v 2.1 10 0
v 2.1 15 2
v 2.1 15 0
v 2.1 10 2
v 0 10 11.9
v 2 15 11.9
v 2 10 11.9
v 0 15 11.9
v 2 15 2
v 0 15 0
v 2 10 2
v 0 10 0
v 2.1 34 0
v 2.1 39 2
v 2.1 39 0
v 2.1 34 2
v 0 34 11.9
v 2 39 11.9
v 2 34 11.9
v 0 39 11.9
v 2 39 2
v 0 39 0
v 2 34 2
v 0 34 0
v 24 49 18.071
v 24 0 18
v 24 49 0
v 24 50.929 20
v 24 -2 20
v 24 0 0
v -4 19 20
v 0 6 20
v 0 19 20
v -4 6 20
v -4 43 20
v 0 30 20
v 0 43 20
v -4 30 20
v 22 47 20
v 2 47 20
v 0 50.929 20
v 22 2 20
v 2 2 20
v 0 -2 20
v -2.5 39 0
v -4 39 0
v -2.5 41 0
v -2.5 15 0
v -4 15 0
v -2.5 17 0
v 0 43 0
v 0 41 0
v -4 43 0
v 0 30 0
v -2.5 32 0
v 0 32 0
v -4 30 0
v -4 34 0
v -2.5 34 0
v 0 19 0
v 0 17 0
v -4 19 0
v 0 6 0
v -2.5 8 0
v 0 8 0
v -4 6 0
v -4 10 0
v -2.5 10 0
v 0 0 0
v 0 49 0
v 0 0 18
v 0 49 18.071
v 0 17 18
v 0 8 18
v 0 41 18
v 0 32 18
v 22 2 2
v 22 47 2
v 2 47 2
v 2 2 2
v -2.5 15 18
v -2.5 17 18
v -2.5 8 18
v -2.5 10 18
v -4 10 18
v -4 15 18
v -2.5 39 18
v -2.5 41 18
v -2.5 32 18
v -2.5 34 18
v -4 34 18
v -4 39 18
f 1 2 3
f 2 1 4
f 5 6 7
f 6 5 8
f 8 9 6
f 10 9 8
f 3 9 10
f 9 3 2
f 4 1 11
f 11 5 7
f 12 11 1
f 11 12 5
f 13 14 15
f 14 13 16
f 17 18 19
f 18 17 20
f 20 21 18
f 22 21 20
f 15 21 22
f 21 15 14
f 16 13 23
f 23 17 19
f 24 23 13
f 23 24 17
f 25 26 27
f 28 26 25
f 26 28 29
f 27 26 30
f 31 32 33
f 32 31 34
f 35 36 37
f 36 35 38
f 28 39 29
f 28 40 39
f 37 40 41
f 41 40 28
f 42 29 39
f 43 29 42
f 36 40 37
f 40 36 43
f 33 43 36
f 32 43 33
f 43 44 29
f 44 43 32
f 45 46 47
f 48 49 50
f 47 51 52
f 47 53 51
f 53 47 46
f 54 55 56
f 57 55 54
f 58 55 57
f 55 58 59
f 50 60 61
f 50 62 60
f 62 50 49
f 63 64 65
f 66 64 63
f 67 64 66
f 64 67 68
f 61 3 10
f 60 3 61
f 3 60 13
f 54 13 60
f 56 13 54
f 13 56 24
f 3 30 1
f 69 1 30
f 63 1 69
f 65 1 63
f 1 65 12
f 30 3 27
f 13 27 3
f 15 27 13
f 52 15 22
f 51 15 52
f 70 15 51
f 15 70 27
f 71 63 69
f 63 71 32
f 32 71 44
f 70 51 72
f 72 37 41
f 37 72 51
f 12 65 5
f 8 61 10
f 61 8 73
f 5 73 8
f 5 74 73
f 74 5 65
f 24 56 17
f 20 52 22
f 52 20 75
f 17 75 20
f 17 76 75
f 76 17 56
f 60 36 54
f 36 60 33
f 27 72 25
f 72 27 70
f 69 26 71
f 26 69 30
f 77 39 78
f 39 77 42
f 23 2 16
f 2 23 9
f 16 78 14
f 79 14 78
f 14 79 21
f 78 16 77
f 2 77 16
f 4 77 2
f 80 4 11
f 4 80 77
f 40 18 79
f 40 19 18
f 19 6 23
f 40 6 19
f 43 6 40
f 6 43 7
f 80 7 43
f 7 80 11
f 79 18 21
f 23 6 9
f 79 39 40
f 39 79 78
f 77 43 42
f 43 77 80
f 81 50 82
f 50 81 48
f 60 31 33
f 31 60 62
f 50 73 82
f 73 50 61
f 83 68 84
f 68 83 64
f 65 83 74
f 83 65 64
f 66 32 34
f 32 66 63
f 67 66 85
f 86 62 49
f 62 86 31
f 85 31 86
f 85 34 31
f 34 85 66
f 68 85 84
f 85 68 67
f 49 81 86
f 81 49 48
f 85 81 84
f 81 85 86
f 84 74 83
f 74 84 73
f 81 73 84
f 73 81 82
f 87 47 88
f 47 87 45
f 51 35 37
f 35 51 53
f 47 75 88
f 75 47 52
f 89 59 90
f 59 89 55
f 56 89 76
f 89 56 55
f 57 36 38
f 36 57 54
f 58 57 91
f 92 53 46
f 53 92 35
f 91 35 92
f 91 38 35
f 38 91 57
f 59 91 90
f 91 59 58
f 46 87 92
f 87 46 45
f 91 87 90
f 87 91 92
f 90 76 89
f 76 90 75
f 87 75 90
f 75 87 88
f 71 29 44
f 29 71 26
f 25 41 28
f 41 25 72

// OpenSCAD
// (C) 2016 B. Visee, info@lichtsignaal.nl
// This is for making lightboxes in, mostly, h0-scale, houses
// No guarentees, but I like it!

// You can make it all sorts of sizes with an adjustable
// number of holes for your LED's (also adjustable!)
// Printed at 0.25mm or 0.3mm height. 0.4 is too big
// The parameters are INSIDE sizes!

// ===================================
// ** CHANGELOG
// ===================================

// v1 Added better spacing for holes
//    Added holestart parameter so you can align hole(s) from the sides
// v2 Started working on inner walls for bigger boxes, easier to glue
// v3 Add one print mount, have to do the multiple ones yet ;)

// ===================================
// ** ToDo
// ===================================

// Add inner-wall options, with auto?

// ===================================
// ** START USER PARAMETERS
// ===================================

// Basic sizes (inner sizes)
depth = 20;
width = 45;
height = 20;
thick = 2;          // Thickness of box walls, varies for printers
                    // Does not affect bottom btw! That is steady 2mm.
thicklimit = 6;     // Limit for adding 45 degree supports                    

// Holes with automatic spacing
enableholes = 0;    // Simple holes in the back
diameter = 3.5;     // On my da Vinci this is the size for 3mm LED
numholes = 3;       // Number of holes you want, if set auto = 0
holestart = 5;      // Start/end position of hole

// Mount for print, no automatic spacing for maximum flexibility
enableprint = 1;    // Adds a slide-in mount for a print
printwidth = 6;
numprints = 2;
printspacing = 24;  // Space between print mounts
printstart = 6;     // Y-start position

// ===================================
// ** END USER PARAMETERS
// ===================================

// For good measure
outerdepth = depth + (thick*2);     // X
outerwidth = width + (thick*2);     // Y
outerheight = height;               // Z

// TESTING

// END TESTING

// Space between inner holes
holespacing = ( width - ( ( holestart * 2 ) + diameter ) ) / (numholes - 1);

union()
{
    difference()
    {
        // Base cube
        cube([outerdepth,outerwidth,outerheight]);

        translate([thick, thick, 2])
        {
            cube([depth,width,height]);
        }
        
        // Slider opening
        if(enableprint)
        {
            // Add center one for one print, ToDo
            for (n = [ 0 : (numprints-1) ])
            {
                translate([0,printstart+(n*printspacing),0])
                {
                    difference()
                    {
                        translate([-0.5,4,-0.1])
                        {
                            cube([0.6+thick,printwidth-1,height-8]);
                        }
                    }
                }
            }
        }
        
        // Holes in the back
        if(enableholes)
        {
            if(numholes == 1)
            {
                translate([(depth/2)+(thick),(outerwidth/2),-3])
                {
                    cylinder(10,d=diameter,diameter/2,$fn=50);
                }
            }
            else
            {
                for (n = [ 1 : numholes ] )
                {
                    
                    if( n == 1 )
                    {
                        translate([(depth/2)+(thick),holestart+thick+(diameter/2),-3])
                        {
                            cylinder(10,d=diameter,diameter/2,$fn=50);
                        }
                    }
                   
                    if ( (n == numholes) && ( n != 1) )
                    {
                        translate([(depth/2)+(thick),width - ( (holestart-thick) +(diameter/2) ),-3])
                        {
                            cylinder(10,d=diameter,diameter/2,$fn=50);
                        }
                    }
                    
                    if( ( n != 1) && ( n != numholes) )
                     {
                        translate([(depth/2)+(thick),( (holespacing* (n-1) )+thick+holestart+(diameter/2)),-3])
                        {
                            //echo( ( (holespacing* (n-1) )+thick+holestart+diameter));
                            cylinder(10,d=diameter,diameter/2,$fn=50);
                        }
                    }   
                }
            }
        }
    }
    
    // Print slider stuff
    if(enableprint)
    {
        for (n = [ 0 : (numprints-1) ])
            {
                translate([0,printstart+(n*printspacing),0])
                {
                    union()
                    {
                        // Sliding part
                        translate([-2.5,printwidth+5,0])
                        {
                            cube([2.5,2,height]);
                        }

                        translate([-2.5,0,0])
                        {
                            cube([2.5,2,height]);
                        }

                        translate([-4,0,0])
                        {
                            cube([1.5,4,height]);
                        }

                        translate([-4,printwidth+3,0])
                        {
                            cube([1.5,4,height]);
                        }
                        
                        translate([-4,1.5,height-2])
                        {
                            cube([4,printwidth+3.5,2]);
                        }
                    }
                }
            }
    }
    
    // Glue edges for smaller sizes
    if(thick<thicklimit)
    {
        translate([0,0,-2])
        {
            difference()
            {
                translate([0,-2,height])
                {    
                    cube([outerdepth,2,2]);
                }

                translate([-1,1,height-1])
                {
                    rotate([135,0,0])
                    {
                        cube([outerdepth+2,5,5]);
                    }
                }
            }
        }
        
        translate([0,outerwidth+2,-2])
        {
            difference()
            {
                translate([0,-2,height])
                {    
                    cube([outerdepth,2,2]);
                }

                translate([-1,4,height-1])
                {
                    rotate([135,0,0])
                    {
                        cube([outerdepth+2,5,5]);
                    }
                }
            }
        }
    }
}
